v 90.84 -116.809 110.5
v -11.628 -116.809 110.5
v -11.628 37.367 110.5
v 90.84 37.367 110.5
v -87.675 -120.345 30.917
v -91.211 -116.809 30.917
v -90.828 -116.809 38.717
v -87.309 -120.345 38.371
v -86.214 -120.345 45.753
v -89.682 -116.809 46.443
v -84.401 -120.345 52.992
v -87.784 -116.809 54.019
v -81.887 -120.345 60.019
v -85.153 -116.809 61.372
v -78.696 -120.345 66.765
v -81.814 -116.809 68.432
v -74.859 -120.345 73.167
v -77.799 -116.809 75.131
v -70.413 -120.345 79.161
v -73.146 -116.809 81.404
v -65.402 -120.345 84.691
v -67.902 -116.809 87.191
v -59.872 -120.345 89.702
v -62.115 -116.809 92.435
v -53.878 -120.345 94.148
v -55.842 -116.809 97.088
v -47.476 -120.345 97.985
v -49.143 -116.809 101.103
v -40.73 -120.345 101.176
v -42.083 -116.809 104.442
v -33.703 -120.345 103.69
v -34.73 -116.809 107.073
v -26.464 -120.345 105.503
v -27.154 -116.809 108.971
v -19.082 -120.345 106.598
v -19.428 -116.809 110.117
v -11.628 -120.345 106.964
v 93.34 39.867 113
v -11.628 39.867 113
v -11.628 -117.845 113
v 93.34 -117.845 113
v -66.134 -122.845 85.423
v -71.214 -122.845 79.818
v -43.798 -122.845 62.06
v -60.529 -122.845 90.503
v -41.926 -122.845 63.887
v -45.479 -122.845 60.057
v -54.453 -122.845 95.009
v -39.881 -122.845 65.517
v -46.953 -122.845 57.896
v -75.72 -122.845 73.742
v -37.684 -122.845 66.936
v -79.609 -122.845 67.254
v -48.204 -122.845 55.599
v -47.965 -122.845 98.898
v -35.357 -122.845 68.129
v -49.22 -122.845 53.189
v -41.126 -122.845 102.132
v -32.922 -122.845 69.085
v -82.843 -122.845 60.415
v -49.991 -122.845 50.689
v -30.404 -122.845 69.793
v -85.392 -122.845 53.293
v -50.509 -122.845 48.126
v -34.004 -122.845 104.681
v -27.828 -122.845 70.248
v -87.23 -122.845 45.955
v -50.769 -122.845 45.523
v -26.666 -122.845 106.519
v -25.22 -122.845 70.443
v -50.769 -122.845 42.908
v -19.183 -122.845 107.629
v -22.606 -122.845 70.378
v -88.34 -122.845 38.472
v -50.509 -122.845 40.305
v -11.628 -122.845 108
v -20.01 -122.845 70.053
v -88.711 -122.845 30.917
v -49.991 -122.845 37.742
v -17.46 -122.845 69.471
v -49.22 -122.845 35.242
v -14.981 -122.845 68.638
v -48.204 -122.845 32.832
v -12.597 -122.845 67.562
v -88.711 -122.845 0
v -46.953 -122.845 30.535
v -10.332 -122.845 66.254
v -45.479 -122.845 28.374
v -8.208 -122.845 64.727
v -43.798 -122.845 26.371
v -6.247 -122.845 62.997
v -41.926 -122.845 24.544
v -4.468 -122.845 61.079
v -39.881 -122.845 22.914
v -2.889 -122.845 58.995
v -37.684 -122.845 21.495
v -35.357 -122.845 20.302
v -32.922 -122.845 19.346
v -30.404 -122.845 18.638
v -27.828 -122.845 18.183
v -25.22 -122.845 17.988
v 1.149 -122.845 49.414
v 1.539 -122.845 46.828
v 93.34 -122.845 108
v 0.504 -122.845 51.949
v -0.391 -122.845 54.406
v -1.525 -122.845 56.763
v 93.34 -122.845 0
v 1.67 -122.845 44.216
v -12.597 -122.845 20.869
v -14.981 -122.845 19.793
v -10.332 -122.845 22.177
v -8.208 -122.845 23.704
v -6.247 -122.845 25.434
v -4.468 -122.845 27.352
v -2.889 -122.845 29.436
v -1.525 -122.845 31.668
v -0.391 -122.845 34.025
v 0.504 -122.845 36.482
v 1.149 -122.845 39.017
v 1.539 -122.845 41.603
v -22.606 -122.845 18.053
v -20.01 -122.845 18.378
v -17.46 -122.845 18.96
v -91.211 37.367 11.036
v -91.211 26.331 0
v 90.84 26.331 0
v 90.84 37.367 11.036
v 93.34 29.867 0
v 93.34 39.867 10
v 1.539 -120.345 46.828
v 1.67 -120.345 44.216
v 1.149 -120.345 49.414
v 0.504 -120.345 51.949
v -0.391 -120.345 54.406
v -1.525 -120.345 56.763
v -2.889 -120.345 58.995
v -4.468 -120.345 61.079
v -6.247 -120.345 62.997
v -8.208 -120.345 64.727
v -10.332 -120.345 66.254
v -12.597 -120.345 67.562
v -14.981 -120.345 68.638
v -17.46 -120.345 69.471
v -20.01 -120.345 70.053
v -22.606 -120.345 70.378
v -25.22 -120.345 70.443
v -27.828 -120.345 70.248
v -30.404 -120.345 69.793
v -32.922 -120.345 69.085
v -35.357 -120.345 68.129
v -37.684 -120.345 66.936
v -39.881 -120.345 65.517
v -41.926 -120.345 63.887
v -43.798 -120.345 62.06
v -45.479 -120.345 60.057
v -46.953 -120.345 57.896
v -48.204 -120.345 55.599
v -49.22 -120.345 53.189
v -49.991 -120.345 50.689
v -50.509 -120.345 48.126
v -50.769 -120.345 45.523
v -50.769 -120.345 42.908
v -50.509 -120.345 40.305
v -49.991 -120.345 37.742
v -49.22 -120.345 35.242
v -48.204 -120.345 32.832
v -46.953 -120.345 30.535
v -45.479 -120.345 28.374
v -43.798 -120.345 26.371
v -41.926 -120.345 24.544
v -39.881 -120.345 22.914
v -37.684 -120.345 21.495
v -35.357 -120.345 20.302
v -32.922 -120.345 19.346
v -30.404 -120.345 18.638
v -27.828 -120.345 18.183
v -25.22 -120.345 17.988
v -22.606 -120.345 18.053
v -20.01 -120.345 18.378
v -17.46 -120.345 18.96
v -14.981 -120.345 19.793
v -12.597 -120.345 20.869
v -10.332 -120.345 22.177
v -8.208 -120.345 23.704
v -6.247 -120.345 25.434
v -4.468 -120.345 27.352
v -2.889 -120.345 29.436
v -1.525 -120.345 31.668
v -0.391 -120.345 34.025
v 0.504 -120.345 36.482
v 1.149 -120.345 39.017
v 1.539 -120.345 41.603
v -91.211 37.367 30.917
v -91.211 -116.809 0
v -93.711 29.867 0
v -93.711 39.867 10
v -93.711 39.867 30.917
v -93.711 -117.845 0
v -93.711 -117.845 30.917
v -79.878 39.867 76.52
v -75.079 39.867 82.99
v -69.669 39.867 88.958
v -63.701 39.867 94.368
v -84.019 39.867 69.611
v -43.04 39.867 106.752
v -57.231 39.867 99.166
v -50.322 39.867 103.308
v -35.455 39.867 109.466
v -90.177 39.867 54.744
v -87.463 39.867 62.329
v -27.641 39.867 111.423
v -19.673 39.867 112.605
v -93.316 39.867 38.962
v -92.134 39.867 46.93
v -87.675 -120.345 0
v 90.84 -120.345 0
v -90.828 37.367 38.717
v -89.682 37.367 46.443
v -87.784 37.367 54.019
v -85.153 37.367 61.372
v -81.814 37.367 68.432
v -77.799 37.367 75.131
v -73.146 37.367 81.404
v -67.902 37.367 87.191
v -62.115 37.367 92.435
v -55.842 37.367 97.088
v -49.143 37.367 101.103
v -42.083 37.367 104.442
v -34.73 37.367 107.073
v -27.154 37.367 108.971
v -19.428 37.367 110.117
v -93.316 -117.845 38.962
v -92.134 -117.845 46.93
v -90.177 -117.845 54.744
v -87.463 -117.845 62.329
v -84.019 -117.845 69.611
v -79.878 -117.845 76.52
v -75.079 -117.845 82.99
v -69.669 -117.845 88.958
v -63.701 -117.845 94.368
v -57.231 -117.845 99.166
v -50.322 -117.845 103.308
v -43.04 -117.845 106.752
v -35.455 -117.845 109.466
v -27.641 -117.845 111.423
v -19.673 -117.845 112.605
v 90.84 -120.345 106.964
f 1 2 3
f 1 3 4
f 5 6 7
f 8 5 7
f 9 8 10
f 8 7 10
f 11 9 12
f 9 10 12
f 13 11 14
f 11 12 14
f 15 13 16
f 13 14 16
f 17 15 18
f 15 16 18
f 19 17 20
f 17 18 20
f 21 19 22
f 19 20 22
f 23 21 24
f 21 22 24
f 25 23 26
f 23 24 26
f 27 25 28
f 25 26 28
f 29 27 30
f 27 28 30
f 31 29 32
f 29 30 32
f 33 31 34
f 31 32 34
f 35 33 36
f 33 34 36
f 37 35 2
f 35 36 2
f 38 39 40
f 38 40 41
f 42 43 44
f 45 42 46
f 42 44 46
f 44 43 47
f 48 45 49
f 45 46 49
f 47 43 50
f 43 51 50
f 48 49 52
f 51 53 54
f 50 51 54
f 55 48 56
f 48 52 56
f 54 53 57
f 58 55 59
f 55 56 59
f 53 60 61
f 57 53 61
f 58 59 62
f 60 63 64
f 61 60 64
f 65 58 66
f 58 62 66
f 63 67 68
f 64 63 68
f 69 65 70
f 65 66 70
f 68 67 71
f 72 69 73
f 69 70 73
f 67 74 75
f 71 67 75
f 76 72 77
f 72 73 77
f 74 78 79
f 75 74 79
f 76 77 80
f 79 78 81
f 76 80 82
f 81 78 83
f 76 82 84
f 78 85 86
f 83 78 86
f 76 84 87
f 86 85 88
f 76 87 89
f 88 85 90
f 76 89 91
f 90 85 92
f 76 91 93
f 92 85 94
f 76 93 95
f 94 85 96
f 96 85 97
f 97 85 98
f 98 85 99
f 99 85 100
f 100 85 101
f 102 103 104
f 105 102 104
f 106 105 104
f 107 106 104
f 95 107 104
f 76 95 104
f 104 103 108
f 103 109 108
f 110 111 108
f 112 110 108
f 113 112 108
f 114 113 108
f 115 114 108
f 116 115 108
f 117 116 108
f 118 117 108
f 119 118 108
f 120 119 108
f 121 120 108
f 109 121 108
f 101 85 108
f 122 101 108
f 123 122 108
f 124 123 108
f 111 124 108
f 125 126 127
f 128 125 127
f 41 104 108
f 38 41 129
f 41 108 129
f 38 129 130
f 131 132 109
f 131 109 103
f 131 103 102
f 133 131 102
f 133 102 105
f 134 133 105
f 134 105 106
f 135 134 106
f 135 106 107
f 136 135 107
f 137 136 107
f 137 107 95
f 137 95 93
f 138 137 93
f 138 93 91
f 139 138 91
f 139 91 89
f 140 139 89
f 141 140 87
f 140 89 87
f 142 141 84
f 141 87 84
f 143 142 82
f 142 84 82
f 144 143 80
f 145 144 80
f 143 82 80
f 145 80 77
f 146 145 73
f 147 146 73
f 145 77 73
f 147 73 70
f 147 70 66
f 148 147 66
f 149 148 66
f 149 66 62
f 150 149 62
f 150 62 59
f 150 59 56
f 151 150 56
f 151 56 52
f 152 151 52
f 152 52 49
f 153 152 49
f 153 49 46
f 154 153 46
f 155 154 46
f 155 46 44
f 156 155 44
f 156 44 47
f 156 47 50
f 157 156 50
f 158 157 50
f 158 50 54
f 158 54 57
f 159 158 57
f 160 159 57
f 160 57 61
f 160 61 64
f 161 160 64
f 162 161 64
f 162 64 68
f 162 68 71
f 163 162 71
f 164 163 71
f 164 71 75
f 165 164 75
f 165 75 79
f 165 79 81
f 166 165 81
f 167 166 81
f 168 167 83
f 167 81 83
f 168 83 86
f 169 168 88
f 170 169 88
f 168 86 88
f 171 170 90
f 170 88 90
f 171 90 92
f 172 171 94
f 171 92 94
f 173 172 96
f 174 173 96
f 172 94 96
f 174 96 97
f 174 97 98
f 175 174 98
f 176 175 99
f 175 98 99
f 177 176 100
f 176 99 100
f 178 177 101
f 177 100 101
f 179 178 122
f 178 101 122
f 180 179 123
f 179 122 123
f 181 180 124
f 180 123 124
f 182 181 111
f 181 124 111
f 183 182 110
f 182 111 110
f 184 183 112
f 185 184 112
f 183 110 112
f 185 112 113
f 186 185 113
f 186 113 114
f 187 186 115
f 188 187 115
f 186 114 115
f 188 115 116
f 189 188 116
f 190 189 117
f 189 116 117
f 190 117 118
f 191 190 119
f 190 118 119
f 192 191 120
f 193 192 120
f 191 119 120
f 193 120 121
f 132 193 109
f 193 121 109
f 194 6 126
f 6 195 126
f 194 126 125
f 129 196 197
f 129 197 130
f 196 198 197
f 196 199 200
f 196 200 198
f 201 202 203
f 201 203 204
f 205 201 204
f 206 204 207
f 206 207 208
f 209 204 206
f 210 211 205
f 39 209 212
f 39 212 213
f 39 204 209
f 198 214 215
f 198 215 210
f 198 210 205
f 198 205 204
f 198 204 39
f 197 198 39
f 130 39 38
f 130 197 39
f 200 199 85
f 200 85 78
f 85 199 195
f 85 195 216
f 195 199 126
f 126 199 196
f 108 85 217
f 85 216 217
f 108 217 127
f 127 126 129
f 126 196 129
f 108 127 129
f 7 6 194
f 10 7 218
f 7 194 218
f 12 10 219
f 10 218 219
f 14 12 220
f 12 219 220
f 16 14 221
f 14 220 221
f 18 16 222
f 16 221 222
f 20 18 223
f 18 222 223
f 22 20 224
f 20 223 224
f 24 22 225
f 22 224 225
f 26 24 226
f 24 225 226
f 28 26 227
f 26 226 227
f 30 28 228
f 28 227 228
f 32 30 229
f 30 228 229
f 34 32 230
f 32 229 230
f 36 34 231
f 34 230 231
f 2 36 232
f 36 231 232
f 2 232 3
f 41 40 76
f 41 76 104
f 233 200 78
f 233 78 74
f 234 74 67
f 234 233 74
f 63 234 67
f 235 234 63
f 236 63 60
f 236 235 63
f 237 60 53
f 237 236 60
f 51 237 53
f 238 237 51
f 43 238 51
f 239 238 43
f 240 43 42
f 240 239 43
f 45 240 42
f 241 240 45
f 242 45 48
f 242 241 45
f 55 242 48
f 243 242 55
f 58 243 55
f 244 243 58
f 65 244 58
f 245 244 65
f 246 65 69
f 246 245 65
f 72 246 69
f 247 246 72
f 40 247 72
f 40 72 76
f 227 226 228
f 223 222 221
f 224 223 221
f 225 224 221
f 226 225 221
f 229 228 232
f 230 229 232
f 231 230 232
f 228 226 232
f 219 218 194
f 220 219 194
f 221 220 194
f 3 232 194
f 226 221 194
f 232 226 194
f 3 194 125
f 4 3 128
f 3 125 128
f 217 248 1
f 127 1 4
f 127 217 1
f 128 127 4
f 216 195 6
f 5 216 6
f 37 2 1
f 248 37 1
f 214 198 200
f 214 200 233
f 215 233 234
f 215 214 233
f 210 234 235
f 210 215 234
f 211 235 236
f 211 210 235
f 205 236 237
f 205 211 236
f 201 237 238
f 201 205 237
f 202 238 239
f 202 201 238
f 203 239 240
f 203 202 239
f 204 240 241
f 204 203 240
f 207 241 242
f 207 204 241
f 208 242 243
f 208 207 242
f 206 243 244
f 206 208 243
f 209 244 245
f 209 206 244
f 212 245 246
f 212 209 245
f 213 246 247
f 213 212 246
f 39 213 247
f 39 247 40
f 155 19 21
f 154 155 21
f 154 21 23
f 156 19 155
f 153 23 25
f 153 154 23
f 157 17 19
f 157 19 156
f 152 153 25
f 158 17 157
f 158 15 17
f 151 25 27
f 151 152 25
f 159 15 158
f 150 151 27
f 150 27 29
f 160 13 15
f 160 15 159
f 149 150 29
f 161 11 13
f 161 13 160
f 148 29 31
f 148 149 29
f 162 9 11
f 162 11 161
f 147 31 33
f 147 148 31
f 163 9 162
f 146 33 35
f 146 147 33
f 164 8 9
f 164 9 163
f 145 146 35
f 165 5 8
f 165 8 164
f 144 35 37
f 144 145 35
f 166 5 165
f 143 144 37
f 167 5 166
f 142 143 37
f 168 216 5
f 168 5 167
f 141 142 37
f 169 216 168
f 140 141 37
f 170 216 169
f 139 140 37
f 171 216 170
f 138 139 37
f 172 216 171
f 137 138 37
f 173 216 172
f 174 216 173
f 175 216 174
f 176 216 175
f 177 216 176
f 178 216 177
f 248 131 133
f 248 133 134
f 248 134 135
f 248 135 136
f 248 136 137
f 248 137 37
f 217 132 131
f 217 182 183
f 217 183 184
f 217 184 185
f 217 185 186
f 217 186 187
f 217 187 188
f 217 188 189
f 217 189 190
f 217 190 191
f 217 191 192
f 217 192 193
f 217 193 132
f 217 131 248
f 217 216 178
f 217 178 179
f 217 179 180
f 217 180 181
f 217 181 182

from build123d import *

# Parameters (mm, degrees)
F0_W     = 187.050685
F0_H     = 162.711885
F1_DEPTH = 113
F2_R     = 82.083261
F3_SIZE  = 5
F4_SIZE  = 10
F5_T     = -2.5
F6_R     = 26.235681
F7_DEPTH = 78


with BuildPart() as f1:
    # F0 (on Top) → F1 (new body)
    with BuildSketch(Plane.XY):
        with Locations((-0.18569, -41.488969)):
            Rectangle(F0_W, F0_H)
    extrude(amount=F1_DEPTH)

    # F2
    f2_edges = [f1.edges().sort_by_distance(p)[0] for p in [
        (-93.711033, -41.48897, 113),
    ]]
    fillet(f2_edges, radius=F2_R)

    # F3
    f3_edges = [f1.edges().sort_by_distance(p)[0] for p in [
        (40.85594, -122.844912, 113),
    ]]
    chamfer(f3_edges, length=F3_SIZE)

    # F4
    f4_edges = [f1.edges().sort_by_distance(p)[0] for p in [
        (-0.185691, 39.866973, 0),
    ]]
    chamfer(f4_edges, length=F4_SIZE)

    # F5
    f5_openings = [f1.faces().sort_by_distance(p)[0] for p in [
        (-0.145476, -46.456271, 0),
    ]]
    offset(amount=F5_T, openings=f5_openings)

    # F6 (on face) → F7 (cut)
    with BuildSketch(Plane.XZ.offset(122.844912)):
        with Locations((-24.566162, 44.215515)):
            Circle(F6_R)
    extrude(amount=-F7_DEPTH, mode=Mode.SUBTRACT)


solid = f1.part
